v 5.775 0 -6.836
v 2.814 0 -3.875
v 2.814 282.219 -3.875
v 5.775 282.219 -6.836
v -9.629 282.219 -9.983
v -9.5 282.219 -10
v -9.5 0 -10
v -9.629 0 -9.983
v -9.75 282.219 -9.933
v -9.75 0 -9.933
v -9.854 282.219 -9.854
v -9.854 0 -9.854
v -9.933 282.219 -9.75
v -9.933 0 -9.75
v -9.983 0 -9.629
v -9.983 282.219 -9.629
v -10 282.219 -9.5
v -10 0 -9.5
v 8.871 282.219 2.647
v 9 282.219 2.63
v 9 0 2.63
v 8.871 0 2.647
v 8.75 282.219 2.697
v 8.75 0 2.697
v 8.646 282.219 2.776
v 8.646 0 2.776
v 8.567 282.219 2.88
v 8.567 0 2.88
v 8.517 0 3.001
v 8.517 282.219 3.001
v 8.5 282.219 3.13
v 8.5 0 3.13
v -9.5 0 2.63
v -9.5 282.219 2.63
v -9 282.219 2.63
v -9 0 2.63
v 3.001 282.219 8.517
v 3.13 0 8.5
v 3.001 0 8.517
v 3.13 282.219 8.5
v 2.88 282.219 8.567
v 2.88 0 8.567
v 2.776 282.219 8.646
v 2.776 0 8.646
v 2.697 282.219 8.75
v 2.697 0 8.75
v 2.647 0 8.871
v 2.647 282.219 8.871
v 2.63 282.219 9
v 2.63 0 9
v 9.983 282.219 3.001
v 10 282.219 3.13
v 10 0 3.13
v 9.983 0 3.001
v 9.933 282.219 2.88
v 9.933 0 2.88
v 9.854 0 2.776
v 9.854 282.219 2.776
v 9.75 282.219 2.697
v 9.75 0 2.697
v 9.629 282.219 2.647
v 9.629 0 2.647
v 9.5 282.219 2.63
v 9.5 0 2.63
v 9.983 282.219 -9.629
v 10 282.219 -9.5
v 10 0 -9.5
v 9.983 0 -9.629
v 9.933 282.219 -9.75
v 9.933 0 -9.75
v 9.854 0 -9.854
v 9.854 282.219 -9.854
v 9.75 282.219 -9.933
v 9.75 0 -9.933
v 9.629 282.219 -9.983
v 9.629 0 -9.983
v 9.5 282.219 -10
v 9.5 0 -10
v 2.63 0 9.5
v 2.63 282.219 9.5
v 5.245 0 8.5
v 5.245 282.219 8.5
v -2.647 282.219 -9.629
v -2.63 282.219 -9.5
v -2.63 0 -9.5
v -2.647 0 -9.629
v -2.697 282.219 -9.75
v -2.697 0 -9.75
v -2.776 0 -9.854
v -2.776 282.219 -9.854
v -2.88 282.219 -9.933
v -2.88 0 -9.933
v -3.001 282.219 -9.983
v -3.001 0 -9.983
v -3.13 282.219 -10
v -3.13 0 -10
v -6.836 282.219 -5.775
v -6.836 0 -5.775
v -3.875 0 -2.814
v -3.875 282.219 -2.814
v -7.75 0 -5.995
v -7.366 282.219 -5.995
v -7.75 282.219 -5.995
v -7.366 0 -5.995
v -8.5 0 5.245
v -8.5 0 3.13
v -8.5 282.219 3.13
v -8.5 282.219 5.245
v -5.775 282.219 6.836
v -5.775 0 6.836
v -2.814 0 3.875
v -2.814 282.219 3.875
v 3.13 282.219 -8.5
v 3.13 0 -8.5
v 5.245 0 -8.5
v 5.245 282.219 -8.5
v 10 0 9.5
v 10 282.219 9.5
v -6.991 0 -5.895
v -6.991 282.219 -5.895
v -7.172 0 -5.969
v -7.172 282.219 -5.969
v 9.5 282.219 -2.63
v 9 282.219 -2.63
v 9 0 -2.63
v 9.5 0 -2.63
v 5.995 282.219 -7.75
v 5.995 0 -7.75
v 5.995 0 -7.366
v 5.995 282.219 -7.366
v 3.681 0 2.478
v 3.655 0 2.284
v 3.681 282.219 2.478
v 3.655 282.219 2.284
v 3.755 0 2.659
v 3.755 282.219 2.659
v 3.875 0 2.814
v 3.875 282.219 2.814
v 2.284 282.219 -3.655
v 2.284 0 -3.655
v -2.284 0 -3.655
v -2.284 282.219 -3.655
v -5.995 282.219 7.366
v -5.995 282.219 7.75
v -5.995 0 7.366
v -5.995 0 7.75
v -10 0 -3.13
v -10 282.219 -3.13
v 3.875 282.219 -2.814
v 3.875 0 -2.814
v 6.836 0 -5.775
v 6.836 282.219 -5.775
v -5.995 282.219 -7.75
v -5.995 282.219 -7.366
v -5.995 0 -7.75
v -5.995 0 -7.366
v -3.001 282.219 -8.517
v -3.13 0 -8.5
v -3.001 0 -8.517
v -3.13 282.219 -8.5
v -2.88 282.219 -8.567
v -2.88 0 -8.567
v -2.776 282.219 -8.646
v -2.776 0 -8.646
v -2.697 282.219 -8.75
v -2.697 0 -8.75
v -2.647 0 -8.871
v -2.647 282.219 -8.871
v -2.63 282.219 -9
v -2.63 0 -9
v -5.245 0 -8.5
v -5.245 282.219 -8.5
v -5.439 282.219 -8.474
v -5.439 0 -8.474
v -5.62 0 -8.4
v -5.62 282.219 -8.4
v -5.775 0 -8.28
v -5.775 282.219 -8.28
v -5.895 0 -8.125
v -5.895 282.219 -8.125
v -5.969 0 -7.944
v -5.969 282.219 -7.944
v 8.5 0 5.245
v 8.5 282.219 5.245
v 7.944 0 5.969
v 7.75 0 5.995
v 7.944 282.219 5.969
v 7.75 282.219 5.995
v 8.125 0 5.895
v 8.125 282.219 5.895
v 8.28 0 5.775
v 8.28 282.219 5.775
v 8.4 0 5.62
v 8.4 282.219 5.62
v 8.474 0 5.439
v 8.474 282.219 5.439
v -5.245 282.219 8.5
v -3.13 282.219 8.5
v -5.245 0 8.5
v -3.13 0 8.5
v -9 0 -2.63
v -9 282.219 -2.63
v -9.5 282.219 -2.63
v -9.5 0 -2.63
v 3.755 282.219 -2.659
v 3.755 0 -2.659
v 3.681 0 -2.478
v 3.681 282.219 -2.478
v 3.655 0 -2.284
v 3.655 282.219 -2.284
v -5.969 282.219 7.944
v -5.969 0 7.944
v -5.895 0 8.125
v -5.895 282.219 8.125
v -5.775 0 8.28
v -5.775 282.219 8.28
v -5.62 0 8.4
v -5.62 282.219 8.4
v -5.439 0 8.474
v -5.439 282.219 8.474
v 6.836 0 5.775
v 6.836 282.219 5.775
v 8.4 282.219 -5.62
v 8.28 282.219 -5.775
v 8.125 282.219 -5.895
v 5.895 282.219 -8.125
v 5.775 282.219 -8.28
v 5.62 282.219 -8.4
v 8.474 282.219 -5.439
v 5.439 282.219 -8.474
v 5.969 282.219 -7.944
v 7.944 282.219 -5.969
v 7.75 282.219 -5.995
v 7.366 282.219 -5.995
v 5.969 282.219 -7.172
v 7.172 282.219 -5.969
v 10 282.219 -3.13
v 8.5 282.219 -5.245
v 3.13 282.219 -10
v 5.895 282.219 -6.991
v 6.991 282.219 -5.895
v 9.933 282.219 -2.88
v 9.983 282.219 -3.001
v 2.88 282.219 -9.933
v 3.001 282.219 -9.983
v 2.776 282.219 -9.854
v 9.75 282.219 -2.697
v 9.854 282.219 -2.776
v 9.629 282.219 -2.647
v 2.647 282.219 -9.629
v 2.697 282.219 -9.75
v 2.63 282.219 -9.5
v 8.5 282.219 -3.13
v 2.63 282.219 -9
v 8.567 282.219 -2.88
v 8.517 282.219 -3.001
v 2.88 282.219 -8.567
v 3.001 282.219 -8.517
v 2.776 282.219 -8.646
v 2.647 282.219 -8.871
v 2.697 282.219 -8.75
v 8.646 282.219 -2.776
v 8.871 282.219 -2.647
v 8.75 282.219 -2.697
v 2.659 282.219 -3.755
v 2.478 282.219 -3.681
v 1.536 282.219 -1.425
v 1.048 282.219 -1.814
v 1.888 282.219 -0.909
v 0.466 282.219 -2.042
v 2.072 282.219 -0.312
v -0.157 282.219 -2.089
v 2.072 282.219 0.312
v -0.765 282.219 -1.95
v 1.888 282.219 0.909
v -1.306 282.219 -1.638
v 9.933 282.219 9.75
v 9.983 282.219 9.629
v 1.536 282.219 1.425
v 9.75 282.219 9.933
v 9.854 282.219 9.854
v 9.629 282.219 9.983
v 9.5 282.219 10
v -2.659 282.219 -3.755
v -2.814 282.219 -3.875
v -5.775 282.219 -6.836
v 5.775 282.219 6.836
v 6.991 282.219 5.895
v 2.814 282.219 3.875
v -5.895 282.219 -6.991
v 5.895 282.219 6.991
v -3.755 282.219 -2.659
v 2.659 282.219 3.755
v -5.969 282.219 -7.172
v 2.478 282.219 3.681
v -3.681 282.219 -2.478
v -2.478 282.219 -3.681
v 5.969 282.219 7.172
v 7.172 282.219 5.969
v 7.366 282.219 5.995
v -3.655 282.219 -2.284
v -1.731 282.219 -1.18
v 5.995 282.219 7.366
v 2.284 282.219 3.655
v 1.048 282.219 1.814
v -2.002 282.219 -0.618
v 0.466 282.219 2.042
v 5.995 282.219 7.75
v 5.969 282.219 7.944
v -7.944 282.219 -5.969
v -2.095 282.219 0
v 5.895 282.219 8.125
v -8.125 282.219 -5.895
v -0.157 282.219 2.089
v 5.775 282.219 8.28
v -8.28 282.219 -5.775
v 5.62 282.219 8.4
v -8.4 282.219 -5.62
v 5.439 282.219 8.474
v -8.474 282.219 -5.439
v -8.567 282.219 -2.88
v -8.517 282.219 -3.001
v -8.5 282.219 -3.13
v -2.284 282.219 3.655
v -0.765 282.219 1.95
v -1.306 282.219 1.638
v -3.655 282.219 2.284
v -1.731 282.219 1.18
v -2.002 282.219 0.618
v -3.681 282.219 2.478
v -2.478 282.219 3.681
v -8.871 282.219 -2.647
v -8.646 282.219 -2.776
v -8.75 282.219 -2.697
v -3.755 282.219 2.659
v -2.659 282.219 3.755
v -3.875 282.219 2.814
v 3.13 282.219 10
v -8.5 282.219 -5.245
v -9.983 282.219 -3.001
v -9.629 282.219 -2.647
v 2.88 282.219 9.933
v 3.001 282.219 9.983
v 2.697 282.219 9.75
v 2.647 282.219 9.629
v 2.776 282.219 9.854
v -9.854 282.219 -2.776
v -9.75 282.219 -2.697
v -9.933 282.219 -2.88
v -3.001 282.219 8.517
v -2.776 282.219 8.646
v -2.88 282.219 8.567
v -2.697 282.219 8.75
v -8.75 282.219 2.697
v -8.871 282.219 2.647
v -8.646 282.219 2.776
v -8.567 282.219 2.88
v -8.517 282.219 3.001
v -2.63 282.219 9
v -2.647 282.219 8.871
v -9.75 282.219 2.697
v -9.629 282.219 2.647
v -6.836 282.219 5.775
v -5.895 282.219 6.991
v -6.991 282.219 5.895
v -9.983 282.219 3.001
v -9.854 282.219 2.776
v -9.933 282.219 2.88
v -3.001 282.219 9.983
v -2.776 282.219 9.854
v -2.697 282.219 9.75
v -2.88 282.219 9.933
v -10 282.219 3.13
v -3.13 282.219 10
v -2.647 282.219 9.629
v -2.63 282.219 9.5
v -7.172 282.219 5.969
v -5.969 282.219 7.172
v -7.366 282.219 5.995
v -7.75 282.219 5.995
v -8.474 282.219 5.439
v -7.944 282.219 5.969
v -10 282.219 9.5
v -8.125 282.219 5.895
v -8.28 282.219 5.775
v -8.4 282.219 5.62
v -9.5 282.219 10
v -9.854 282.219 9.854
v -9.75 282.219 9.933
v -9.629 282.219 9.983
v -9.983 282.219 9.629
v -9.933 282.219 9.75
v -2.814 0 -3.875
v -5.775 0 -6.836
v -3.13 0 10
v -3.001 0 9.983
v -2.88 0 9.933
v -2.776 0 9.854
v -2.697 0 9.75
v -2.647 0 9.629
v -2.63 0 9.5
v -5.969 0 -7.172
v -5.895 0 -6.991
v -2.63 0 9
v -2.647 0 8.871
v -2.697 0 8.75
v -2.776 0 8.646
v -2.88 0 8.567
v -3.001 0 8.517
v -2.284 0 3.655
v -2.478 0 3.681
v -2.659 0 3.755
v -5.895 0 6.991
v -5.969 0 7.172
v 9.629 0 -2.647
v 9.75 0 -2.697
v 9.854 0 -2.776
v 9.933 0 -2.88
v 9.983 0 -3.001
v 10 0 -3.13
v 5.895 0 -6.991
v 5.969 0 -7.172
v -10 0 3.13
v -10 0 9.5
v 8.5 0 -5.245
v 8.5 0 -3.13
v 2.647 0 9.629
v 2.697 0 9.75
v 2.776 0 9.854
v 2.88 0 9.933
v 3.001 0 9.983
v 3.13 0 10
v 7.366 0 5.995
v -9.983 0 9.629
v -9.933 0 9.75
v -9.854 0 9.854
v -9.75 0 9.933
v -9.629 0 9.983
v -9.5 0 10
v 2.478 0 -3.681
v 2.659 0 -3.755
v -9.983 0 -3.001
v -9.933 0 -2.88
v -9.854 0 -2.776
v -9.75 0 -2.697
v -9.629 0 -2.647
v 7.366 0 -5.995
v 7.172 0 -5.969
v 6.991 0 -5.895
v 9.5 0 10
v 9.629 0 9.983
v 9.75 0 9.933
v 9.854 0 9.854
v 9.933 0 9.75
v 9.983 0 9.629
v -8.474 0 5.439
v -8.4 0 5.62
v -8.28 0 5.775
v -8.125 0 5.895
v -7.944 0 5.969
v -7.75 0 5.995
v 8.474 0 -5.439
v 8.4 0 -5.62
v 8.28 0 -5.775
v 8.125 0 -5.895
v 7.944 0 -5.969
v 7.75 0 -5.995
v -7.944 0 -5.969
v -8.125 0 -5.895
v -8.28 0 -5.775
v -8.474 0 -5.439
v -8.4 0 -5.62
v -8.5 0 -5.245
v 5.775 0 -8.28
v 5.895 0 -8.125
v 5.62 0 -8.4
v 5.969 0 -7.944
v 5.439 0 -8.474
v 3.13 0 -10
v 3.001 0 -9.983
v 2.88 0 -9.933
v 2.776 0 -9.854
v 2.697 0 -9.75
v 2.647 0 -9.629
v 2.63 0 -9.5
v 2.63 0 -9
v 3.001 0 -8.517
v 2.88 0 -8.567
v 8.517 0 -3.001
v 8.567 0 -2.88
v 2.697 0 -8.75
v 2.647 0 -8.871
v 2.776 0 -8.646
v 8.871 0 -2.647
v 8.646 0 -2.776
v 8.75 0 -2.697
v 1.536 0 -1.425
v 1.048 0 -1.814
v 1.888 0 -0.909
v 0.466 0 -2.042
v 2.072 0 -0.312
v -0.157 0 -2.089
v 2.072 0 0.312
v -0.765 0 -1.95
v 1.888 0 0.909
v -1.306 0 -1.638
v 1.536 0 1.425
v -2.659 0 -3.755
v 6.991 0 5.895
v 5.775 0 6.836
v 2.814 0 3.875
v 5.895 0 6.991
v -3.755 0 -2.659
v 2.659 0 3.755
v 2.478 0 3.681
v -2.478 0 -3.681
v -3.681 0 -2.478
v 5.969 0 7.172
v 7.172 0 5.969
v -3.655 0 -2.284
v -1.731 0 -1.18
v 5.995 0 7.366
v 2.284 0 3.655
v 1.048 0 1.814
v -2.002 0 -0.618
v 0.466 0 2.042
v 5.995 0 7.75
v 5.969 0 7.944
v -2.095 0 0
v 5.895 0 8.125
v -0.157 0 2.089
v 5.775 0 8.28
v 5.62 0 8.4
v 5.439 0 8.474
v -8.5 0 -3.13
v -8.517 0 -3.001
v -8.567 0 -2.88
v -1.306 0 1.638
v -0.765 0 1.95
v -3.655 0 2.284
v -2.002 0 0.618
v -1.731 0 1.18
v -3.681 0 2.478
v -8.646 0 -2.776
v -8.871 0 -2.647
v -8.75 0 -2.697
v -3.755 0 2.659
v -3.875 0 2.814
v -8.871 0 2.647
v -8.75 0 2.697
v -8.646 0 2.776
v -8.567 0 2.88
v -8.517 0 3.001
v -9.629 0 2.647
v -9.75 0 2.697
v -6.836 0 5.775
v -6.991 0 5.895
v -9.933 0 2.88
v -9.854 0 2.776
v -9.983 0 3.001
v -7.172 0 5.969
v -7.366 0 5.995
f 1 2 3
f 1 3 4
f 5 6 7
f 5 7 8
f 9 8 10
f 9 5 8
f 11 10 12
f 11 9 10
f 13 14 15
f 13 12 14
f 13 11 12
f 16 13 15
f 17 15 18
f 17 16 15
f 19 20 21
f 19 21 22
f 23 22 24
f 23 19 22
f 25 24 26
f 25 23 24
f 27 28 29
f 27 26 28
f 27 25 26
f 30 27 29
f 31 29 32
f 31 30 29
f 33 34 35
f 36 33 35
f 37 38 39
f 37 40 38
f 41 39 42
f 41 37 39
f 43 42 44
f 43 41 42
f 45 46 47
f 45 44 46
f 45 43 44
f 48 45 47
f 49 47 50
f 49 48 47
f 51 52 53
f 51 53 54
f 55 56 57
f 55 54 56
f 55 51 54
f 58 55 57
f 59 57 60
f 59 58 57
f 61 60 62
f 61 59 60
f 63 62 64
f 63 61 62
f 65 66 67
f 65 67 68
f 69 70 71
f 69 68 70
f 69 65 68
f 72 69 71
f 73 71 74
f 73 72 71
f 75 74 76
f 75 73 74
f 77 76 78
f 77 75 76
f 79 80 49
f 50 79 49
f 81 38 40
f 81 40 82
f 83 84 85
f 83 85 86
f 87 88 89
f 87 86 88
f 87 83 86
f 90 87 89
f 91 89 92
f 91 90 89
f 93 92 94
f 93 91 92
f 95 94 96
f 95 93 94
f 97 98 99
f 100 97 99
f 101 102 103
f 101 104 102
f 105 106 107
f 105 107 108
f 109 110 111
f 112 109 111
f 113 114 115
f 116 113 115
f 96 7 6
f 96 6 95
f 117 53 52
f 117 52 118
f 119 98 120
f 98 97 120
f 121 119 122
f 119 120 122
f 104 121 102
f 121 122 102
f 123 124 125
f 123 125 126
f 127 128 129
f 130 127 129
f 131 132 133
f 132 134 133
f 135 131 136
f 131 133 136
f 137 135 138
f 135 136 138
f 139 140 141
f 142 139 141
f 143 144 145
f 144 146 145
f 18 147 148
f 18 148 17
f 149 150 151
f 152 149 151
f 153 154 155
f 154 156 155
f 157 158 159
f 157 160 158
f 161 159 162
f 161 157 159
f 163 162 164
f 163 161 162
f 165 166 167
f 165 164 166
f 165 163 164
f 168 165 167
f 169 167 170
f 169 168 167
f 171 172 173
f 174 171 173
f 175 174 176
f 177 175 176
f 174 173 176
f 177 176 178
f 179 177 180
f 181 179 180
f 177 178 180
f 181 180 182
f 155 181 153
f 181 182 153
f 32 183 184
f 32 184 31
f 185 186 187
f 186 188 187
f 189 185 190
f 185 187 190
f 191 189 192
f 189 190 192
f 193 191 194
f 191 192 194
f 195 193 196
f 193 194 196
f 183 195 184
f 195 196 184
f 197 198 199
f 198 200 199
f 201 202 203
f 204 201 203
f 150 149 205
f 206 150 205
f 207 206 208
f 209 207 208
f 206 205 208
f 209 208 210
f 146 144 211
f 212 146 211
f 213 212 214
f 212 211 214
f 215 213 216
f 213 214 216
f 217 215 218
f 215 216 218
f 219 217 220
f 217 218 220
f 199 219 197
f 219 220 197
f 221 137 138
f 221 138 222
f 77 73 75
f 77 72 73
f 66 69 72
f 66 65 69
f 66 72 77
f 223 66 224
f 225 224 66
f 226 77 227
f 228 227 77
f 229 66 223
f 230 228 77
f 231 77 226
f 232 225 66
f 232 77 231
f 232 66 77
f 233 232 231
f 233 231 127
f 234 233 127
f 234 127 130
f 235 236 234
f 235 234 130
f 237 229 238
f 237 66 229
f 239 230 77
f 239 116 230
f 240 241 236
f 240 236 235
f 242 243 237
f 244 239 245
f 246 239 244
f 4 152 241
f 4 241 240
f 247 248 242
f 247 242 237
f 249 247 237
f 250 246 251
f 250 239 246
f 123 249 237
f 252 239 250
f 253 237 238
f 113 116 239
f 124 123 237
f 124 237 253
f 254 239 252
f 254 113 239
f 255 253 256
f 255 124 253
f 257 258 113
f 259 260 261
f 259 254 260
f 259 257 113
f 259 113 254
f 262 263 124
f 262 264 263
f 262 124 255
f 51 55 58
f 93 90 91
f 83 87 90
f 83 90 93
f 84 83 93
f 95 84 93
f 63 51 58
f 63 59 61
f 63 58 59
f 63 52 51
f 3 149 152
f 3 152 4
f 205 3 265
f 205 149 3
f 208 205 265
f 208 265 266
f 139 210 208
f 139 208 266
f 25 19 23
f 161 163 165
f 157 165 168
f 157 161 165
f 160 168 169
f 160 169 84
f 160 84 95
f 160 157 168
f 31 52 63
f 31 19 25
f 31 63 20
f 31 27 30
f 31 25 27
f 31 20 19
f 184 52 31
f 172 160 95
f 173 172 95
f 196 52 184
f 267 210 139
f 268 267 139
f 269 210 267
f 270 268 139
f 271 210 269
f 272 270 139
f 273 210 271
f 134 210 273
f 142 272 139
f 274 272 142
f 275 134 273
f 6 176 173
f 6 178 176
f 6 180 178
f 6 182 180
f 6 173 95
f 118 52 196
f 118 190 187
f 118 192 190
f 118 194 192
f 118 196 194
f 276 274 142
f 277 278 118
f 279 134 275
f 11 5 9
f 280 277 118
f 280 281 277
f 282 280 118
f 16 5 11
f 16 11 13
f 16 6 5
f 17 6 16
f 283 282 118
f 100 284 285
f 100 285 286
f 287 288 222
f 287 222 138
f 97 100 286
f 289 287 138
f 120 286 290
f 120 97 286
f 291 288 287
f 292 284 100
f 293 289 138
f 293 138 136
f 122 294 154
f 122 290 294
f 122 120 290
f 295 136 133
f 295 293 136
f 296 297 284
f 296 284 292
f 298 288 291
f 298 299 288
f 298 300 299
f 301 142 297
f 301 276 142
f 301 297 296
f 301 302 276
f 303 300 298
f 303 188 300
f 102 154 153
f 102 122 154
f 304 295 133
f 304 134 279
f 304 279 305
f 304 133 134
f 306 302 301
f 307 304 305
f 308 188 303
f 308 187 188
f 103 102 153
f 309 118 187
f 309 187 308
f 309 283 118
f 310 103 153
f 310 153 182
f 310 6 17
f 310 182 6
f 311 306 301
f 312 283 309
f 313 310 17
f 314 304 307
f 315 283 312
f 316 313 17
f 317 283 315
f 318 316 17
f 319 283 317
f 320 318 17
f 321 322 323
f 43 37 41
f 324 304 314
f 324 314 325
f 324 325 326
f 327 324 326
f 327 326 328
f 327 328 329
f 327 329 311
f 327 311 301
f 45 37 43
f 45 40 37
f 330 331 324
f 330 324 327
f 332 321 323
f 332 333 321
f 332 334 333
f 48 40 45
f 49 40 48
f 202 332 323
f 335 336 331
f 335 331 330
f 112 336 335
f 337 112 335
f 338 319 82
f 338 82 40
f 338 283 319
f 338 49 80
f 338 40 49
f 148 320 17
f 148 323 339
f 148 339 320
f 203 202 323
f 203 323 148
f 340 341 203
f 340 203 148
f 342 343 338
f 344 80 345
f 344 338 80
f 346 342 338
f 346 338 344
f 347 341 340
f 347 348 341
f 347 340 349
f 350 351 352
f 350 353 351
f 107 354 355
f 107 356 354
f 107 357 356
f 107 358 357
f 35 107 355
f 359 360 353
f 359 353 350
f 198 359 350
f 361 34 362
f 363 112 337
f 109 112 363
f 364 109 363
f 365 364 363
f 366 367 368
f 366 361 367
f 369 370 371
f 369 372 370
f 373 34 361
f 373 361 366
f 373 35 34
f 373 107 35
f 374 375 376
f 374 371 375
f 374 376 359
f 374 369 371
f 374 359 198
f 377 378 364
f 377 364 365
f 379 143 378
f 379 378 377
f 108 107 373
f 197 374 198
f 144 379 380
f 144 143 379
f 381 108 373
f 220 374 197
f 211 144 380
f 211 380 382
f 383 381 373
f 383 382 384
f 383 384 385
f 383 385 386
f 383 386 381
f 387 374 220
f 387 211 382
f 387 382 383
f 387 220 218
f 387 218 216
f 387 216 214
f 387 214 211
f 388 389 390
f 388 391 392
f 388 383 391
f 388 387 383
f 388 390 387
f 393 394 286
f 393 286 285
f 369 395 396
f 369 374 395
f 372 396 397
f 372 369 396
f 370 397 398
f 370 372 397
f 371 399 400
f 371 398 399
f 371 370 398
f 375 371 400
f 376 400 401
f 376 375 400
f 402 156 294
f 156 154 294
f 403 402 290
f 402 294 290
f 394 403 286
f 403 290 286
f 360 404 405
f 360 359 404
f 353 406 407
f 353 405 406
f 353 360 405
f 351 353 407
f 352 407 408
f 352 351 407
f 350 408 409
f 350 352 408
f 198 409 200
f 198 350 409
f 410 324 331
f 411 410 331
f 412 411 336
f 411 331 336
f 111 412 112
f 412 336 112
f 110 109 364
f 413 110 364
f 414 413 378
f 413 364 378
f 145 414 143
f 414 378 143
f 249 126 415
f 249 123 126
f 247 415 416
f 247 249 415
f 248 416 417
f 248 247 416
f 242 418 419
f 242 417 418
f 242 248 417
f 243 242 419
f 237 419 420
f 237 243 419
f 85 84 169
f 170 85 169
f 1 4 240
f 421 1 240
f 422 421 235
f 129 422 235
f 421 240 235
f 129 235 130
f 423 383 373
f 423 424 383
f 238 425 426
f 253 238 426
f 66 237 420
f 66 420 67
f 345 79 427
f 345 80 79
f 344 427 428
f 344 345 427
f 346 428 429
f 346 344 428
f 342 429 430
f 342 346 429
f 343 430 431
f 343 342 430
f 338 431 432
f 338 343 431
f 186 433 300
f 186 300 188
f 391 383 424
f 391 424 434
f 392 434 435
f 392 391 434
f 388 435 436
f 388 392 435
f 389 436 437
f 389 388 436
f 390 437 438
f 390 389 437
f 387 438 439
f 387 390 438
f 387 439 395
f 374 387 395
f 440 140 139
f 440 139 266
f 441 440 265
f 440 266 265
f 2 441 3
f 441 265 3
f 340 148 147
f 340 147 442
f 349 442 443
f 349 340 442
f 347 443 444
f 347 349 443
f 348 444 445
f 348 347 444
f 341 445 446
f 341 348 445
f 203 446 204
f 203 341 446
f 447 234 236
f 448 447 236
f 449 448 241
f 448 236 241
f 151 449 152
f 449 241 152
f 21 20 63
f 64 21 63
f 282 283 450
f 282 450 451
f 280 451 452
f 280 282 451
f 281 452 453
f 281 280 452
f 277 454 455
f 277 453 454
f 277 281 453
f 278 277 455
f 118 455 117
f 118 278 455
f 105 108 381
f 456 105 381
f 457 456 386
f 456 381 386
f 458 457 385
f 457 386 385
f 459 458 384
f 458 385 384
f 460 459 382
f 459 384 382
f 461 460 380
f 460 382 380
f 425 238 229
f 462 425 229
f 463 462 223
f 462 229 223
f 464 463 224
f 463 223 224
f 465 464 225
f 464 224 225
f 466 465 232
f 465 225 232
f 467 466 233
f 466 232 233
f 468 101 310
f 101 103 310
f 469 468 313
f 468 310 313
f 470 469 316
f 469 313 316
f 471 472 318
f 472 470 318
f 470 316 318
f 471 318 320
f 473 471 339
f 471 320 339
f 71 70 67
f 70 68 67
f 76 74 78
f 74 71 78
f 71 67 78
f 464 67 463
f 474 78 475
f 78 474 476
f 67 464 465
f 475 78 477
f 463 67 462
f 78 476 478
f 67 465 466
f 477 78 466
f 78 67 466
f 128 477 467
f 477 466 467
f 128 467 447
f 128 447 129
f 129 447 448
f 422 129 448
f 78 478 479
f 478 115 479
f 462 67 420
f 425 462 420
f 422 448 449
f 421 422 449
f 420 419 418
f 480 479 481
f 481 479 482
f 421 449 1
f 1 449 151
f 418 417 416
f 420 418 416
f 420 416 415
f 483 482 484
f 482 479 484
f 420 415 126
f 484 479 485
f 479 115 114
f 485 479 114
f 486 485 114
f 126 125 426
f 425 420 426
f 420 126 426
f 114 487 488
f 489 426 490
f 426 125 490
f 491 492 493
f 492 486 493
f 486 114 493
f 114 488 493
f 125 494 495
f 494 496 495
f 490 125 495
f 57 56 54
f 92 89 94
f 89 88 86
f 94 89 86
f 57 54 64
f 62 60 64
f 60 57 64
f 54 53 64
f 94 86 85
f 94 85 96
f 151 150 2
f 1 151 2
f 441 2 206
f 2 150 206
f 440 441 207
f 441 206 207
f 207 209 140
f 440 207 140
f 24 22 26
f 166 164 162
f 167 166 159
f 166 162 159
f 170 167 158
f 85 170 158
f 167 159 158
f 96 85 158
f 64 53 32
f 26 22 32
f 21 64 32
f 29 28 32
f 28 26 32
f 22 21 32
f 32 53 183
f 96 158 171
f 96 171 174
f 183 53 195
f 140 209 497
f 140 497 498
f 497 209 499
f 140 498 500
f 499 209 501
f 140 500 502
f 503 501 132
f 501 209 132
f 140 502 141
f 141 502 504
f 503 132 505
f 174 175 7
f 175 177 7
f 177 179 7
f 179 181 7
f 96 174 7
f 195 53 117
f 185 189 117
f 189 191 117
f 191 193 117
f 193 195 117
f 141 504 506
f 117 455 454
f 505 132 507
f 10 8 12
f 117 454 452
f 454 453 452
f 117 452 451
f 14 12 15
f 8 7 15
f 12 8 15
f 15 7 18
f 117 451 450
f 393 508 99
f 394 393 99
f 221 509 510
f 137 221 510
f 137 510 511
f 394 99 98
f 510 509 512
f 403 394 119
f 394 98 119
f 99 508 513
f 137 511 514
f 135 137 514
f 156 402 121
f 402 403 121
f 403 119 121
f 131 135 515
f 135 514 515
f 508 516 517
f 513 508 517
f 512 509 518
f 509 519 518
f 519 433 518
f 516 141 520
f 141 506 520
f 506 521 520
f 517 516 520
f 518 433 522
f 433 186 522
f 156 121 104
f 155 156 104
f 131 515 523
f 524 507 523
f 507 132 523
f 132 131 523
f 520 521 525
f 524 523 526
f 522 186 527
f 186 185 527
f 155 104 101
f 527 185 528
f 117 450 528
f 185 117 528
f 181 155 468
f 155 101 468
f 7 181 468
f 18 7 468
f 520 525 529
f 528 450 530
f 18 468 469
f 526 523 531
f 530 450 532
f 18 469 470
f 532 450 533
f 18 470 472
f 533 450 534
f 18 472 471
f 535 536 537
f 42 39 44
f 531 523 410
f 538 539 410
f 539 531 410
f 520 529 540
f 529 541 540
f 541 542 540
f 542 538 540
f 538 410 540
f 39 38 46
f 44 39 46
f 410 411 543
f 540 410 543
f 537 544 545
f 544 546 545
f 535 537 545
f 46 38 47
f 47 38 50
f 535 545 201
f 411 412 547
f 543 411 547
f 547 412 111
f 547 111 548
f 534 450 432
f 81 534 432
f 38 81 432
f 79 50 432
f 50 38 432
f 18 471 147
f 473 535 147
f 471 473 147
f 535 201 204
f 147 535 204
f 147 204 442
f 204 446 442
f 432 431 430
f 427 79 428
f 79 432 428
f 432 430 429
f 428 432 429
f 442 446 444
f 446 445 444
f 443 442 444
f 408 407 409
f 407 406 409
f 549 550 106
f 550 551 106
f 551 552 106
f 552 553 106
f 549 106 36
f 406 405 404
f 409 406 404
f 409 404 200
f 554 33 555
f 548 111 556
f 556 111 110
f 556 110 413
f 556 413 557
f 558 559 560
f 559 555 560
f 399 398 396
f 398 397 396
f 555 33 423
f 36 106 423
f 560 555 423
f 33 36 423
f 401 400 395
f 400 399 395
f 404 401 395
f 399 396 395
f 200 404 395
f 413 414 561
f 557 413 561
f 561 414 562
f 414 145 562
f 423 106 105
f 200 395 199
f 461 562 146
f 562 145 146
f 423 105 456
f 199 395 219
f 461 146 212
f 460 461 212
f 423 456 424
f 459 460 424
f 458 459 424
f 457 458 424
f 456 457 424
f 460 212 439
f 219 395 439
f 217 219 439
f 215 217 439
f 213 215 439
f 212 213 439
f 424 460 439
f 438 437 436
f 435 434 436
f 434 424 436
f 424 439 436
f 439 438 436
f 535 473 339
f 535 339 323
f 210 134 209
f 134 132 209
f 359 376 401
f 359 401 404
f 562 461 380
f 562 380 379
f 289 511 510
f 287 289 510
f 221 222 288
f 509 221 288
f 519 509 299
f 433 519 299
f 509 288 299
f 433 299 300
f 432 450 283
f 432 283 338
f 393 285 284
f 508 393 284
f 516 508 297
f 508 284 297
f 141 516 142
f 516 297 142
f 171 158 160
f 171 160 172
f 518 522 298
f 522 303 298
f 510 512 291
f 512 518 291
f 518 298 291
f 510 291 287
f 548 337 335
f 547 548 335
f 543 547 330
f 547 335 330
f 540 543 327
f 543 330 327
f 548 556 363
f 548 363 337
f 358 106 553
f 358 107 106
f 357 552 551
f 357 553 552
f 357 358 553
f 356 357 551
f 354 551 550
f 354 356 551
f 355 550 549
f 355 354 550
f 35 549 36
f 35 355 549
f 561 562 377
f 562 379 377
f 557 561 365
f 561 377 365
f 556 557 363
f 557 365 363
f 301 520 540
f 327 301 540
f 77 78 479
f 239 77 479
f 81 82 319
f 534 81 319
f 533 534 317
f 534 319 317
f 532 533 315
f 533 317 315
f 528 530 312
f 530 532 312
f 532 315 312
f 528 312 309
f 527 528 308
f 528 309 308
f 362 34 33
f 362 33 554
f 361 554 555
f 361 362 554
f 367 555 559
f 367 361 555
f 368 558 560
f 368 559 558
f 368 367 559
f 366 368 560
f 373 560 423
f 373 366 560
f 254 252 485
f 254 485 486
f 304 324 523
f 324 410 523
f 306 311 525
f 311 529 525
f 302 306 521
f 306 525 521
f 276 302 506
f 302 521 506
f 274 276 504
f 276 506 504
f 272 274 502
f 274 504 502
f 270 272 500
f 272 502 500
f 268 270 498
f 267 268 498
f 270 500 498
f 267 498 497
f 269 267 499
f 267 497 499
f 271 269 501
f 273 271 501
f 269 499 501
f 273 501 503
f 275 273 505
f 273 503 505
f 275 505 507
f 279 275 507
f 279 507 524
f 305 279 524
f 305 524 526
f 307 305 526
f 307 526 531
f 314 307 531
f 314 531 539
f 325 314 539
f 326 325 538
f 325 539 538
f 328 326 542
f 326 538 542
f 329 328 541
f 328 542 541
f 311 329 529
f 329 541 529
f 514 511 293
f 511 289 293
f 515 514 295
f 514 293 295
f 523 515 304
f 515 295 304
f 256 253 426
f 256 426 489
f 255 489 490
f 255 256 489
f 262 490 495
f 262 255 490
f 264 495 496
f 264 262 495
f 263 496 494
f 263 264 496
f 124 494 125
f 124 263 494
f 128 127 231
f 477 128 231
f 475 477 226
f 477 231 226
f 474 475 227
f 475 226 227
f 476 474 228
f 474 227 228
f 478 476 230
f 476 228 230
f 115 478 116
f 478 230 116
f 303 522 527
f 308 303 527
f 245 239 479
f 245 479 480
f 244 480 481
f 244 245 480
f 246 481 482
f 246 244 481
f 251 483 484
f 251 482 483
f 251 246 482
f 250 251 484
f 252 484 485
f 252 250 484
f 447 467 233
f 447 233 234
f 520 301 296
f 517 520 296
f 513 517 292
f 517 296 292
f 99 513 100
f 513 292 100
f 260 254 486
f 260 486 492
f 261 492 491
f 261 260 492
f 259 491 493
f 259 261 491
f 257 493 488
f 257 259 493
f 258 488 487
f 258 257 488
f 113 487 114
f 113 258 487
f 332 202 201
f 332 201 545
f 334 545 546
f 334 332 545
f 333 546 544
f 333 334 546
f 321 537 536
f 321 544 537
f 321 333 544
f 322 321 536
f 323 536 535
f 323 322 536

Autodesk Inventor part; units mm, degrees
ref_plane "YZ Plane" through (0, 0, 0) normal (1, 0, 0) x (0, 1, 0)
ref_plane "XZ Plane" through (0, 0, 0) normal (0, 1, 0) x (-1, 0, 0)
ref_plane "XY Plane" through (0, 0, 0) normal (0, 0, 1) x (1, 0, 0)
sketch "Sketch1" plane through (0, 0, 0) normal (0, 1, 0) x (-1, 0, 0)
  line L0 (0, -14) -> (0, 14) projected
  line L1 (-14, 0) -> (14, 0) projected
  line L2 (14, 0) -> (-14, 0) projected
  line L3 (0, -14) -> (0, 14) projected
  line L4 (2.5943, 3.655) -> (-2.5943, 3.655)
  line L5 (-3.655, 2.5943) -> (-3.655, -2.5943)
  line L6 (-2.5943, -3.655) -> (2.5943, -3.655)
  line L7 (3.655, -2.5943) -> (3.655, 2.5943)
  line L8 (-3.655, 3.655) -> (3.655, -3.655) construction
  line L9 (10, 10) -> (10, 2.63)
  line L10 (10, 2.63) -> (8.5, 2.63)
  line L11 (10, 10) -> (2.63, 10)
  line L12 (2.63, 10) -> (2.63, 8.5)
  line L13 (-10, 10) -> (-2.63, 10)
  line L14 (-2.63, 10) -> (-2.63, 8.5)
  line L15 (-10, 8.5) -> (-10, 10)
  line L16 (-10, 10) -> (-8.5, 10)
  line L17 (-8.5, 2.63) -> (-10, 2.63)
  line L18 (-10, 2.63) -> (-10, 10)
  line L19 (-10, -10) -> (-8.5, -10)
  line L20 (-8.5, -2.63) -> (-10, -2.63)
  line L21 (-10, -2.63) -> (-10, -10)
  line L22 (-10, -10) -> (-2.63, -10)
  line L23 (-2.63, -10) -> (-2.63, -8.5)
  line L24 (-10, -8.5) -> (-10, -10)
  line L25 (10, -10) -> (8.5, -10)
  line L26 (8.5, -2.63) -> (10, -2.63)
  line L27 (10, -2.63) -> (10, -10)
  line L28 (10, -10) -> (2.63, -10)
  line L29 (2.63, -10) -> (2.63, -8.5)
  line L30 (10, -8.5) -> (10, -10)
  circle A0 centre (0, 0) radius 2.095
  line L31 (5.995, -10) -> (2.63, -10)
  line L32 (-2.63, -10) -> (-5.995, -10)
  line L33 (10, -10) -> (2.63, -10)
  line L34 (-2.63, -10) -> (-10, -10)
  line L35 (10, -5.995) -> (10, -2.63)
  line L36 (10, 2.63) -> (10, 5.995)
  line L37 (10, 10) -> (10, 2.63)
  line L38 (10, -2.63) -> (10, -10)
  line L39 (-5.995, 10) -> (-2.63, 10)
  line L40 (2.63, 10) -> (5.995, 10)
  line L41 (-10, 10) -> (-2.63, 10)
  line L42 (2.63, 10) -> (10, 10)
  line L43 (-10, 5.995) -> (-10, 2.63)
  line L44 (-10, -2.63) -> (-10, -5.995)
  line L45 (-10, -10) -> (-10, -2.63)
  line L46 (-10, 2.63) -> (-10, 10)
  line L47 (-2.63, -8.5) -> (-5.995, -8.5)
  line L48 (-8.5, -5.995) -> (-8.5, -2.63)
  line L49 (-8.5, -5.995) -> (-7.0557, -5.995)
  line L50 (-5.995, -8.5) -> (-5.995, -7.0557)
  line L51 (-5.995, 7.0557) -> (-5.995, 8.5)
  line L52 (2.63, 8.5) -> (5.995, 8.5)
  line L53 (8.5, 2.63) -> (8.5, 5.995)
  line L54 (8.5, 5.995) -> (7.0557, 5.995)
  line L55 (5.995, 8.5) -> (5.995, 7.0557)
  line L56 (2.63, -8.5) -> (5.995, -8.5)
  line L57 (9.5607, -8.5) -> (10, -8.5)
  line L58 (8.5, -10) -> (8.5, -9.5607)
  line L59 (8.5, -5.995) -> (8.5, -2.63)
  line L60 (7.0557, -5.995) -> (8.5, -5.995)
  line L61 (5.995, -7.0557) -> (5.995, -8.5)
  line L62 (3.655, 3.655) -> (-0.5303, -0.5303) construction
  line L63 (-1.4814, -1.4814) -> (-3.655, -3.655) construction
  line L64 (-8.5, 10) -> (-8.5, 9.5607)
  line L65 (-8.5, 5.995) -> (-8.5, 2.63)
  line L66 (-2.63, 8.5) -> (-5.995, 8.5)
  line L67 (-9.5607, 8.5) -> (-10, 8.5)
  line L68 (-7.0557, 5.995) -> (-8.5, 5.995)
  line L69 (-3.655, 2.5943) -> (-7.0557, 5.995)
  line L70 (-2.5943, 3.655) -> (-5.995, 7.0557)
  line L71 (5.995, 7.0557) -> (2.5943, 3.655)
  line L72 (7.0557, 5.995) -> (3.655, 2.5943)
  line L73 (7.0557, -5.995) -> (3.655, -2.5943)
  line L74 (5.995, -7.0557) -> (2.5943, -3.655)
  line L75 (-2.5943, -3.655) -> (-5.995, -7.0557)
  line L76 (-3.655, -2.5943) -> (-7.0557, -5.995)
  dimension "d26" = 4.19
  dimension "d0" = 20
  dimension "d1" = 20
  dimension "d2" = 7.31
  dimension "d3" = 7.31
  dimension "d4" = 20
  dimension "d5" = 11.99
  dimension "d6" = 11.99
  dimension "d11" = 7.37
  dimension "d12" = 1.5
  dimension "d13" = 7.37
  dimension "d14" = 1.5
  dimension "d15" = 7.37
  dimension "d16" = 1.5
  dimension "d17" = 7.37
  dimension "d18" = 1.5
  dimension "d19" = 7.37
  dimension "d20" = 7.37
  dimension "d21" = 1.5
  dimension "d22" = 1.5
  dimension "d23" = 7.37
  dimension "d24" = 7.37
  dimension "d25" = 1.5
extrude "Extrusion1" add sketch "Sketch1" along normal blind 282.2194 contours L6 L75 L50 L47 L23 L22 L19 L21 L20 L48 L49 L76 L5 L1 A0 L0 | L0 A0 L1 L7 L73 L60 L59 L26 L27 L25 L28 L29 L56 L61 L74 L6 | L1 L5 L69 L68 L65 L17 L18 L15 L13 L14 L66 L51 L70 L4 L0 A0 | A0 L0 L4 L71 L55 L52 L12 L11 L9 L10 L53 L54 L72 L7 L1
fillet "Fillet1" radius 0.5 20 edges at (10, 141.1097, 10) (2.63, 141.1097, 10) (-2.63, 141.1097, 10) (-2.63, 141.1097, 8.5) (10, 141.1097, 2.63) (8.5, 141.1097, 2.63) (10, 141.1097, -2.63) (8.5, 141.1097, -2.63) (10, 141.1097, -10) (2.63, 141.1097, -8.5) (-2.63, 141.1097, -10) (-2.63, 141.1097, -8.5) (2.63, 141.1097, -10) (-10, 141.1097, -10) (-8.5, 141.1097, -2.63) (-10, 141.1097, -2.63) (-8.5, 141.1097, 2.63) (-10, 141.1097, 2.63) (-10, 141.1097, 10) (2.63, 141.1097, 8.5)
fillet "Fillet2" radius 0.75 24 edges at (-7.0557, 141.1097, 5.995) (-3.655, 141.1097, 2.5943) (-8.5, 141.1097, -5.995) (-7.0557, 141.1097, -5.995) (-5.995, 141.1097, -8.5) (3.655, 141.1097, -2.5943) (7.0557, 141.1097, -5.995) (-2.5943, 141.1097, 3.655) (-5.995, 141.1097, 7.0557) (3.655, 141.1097, 2.5943) (7.0557, 141.1097, 5.995) (8.5, 141.1097, 5.995) (8.5, 141.1097, -5.995) (2.5943, 141.1097, 3.655) (5.995, 141.1097, 7.0557) (5.995, 141.1097, 8.5) (-5.995, 141.1097, 8.5) (-8.5, 141.1097, 5.995) (2.5943, 141.1097, -3.655) (5.995, 141.1097, -7.0557) (5.995, 141.1097, -8.5) (-5.995, 141.1097, -7.0557) (-2.5943, 141.1097, -3.655) (-3.655, 141.1097, -2.5943)
properties part number "proWildStangin"
